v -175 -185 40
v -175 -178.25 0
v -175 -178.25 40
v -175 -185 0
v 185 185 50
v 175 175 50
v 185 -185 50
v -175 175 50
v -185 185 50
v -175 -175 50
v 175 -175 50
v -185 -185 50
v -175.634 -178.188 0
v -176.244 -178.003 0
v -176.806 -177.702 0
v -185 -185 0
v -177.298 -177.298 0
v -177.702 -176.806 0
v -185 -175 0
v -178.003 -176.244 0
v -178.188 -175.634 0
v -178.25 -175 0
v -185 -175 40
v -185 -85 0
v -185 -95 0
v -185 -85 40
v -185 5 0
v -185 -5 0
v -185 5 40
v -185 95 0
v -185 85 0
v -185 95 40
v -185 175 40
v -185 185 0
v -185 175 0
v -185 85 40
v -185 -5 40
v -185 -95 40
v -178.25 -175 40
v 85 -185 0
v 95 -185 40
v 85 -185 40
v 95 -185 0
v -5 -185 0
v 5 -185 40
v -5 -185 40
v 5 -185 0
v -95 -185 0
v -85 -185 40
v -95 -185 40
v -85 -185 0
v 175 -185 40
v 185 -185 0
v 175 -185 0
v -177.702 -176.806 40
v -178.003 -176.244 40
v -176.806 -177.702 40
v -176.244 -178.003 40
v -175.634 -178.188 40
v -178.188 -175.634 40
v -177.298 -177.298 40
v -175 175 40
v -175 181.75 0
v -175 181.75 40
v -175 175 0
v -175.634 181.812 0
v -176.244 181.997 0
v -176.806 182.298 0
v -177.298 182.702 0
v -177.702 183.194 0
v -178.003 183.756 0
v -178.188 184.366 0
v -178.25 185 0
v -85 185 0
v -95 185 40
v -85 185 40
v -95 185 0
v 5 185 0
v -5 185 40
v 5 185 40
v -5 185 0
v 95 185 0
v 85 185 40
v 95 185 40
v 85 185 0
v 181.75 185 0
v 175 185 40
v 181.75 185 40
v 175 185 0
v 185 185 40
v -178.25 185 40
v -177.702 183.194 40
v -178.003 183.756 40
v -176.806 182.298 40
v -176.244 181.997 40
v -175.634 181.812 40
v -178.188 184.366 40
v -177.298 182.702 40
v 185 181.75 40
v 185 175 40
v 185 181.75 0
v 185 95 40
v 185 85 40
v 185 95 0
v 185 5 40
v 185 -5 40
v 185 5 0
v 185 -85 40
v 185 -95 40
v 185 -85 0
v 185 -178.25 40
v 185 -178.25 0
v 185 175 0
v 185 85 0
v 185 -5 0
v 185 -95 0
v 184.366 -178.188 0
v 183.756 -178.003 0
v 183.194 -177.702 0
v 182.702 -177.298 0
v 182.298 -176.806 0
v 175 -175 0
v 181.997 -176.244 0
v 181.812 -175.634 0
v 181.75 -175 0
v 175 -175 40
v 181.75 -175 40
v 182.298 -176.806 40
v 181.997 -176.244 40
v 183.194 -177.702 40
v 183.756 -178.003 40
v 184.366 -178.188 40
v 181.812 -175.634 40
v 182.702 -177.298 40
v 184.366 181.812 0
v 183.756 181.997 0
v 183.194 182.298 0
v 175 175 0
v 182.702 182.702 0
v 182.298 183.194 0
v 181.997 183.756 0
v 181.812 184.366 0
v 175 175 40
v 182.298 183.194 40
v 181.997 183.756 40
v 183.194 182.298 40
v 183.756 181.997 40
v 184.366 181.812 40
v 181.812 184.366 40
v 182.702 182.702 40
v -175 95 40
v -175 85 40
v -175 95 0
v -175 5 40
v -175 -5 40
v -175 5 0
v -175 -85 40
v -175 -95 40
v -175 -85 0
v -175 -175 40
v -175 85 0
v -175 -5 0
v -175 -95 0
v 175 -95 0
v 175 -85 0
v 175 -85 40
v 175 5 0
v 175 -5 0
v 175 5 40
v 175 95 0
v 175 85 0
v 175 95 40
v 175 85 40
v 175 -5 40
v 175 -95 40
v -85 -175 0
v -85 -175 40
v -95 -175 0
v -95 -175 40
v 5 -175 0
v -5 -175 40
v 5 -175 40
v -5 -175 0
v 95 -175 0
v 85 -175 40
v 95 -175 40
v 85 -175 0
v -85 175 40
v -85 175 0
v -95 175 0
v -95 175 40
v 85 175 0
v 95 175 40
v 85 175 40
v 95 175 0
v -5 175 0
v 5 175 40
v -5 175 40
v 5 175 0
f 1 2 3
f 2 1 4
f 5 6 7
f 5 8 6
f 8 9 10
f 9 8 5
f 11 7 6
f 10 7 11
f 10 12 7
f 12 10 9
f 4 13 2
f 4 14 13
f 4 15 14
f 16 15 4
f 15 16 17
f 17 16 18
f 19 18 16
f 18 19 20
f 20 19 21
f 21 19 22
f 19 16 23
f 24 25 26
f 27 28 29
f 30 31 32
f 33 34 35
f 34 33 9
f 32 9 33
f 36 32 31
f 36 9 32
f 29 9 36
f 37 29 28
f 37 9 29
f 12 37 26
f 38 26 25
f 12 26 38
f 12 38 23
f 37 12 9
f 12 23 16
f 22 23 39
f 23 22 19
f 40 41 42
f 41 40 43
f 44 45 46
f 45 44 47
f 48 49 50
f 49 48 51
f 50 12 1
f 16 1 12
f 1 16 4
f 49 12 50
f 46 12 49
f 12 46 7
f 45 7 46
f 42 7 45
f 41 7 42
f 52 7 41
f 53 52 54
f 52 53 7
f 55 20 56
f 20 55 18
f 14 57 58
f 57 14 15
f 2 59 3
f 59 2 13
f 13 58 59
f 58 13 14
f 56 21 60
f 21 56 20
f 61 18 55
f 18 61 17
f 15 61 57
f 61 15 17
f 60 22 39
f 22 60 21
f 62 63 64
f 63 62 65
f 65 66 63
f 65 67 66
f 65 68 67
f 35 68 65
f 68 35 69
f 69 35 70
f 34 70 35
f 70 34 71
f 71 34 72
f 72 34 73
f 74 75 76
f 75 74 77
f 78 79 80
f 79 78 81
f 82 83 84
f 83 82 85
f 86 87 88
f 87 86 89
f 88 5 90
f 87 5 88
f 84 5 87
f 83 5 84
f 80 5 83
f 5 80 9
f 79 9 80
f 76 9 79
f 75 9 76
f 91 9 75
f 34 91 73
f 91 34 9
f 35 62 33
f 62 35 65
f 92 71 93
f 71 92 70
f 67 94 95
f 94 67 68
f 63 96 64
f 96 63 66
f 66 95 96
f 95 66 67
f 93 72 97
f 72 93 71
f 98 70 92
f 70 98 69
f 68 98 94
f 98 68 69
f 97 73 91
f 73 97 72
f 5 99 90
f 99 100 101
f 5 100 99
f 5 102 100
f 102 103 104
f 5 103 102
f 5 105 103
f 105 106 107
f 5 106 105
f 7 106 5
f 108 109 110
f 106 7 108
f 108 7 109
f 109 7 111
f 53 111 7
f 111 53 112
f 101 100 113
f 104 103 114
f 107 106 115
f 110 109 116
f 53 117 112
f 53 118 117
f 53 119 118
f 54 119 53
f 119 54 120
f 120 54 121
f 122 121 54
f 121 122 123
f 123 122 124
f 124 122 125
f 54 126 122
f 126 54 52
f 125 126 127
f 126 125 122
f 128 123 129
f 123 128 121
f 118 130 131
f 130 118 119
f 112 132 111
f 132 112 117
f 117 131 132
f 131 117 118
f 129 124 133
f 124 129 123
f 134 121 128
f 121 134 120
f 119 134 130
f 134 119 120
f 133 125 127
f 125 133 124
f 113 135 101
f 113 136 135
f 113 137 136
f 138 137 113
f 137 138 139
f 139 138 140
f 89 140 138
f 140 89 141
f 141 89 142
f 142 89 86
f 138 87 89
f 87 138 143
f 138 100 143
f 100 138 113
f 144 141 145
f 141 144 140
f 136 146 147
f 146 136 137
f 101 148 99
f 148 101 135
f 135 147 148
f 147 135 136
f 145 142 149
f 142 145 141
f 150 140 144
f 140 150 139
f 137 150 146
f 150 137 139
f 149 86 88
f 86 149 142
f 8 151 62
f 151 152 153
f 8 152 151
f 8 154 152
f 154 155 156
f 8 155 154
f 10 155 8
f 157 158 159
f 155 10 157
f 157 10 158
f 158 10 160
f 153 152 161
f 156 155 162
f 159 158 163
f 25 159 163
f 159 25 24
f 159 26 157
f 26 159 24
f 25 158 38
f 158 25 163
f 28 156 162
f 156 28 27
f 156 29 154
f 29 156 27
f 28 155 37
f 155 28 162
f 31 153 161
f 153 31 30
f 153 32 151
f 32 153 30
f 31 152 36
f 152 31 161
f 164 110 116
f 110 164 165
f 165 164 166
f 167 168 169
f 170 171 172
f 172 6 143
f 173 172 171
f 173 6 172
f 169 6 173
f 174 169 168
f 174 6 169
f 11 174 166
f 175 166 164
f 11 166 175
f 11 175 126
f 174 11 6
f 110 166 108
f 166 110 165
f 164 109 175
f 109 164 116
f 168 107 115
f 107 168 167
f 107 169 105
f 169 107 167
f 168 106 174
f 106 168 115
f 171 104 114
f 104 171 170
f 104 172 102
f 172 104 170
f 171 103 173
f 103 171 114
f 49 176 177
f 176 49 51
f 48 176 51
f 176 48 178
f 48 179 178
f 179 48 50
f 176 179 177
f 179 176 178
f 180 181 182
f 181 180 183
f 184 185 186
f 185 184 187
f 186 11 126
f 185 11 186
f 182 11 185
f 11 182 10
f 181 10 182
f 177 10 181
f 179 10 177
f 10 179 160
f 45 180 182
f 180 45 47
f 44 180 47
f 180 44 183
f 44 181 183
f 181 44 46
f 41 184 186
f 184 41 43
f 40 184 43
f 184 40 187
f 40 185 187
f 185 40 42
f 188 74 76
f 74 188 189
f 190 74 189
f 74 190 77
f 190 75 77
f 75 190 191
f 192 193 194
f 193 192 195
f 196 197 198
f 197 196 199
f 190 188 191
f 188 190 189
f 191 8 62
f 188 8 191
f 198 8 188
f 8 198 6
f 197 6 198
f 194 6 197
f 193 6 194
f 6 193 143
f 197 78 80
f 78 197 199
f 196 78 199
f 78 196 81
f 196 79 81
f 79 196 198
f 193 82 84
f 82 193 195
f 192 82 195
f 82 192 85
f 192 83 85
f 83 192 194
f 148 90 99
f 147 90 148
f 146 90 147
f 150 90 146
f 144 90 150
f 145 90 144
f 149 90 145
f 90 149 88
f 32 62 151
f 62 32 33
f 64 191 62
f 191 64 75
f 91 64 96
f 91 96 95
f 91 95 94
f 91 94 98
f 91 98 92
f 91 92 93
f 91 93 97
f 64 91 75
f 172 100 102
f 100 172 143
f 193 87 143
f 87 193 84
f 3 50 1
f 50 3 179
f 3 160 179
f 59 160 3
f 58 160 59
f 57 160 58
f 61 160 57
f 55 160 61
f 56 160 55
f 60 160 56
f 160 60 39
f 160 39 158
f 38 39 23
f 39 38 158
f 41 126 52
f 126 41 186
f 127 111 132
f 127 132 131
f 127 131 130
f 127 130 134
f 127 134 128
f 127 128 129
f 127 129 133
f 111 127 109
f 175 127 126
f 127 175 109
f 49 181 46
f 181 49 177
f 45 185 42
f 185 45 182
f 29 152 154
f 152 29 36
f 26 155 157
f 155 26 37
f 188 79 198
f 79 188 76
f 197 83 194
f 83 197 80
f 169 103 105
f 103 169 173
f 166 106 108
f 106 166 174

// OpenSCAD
positions = [[-180,-180],[-180,-90],[-180,0],[-180,90],[-180,180],[180,-180],[180,-90],[180,0],[180,90],[180,180],[-90,-180],[0,-180],[90,-180],[-90,180],[0,180],[90,180]];
module vert(px,py){
translate([px,py,25])
difference(){
cube([10,10,50],center=true);
if (abs(px)==180 && abs(py)==180){
translate([5,5,0]) cylinder(r=3.25,h=55,$fn=32,center=true);
}
}
}
module hleft(zh){translate([-180,0,zh]) cube([10,370,10],center=true);}
module hright(zh){translate([180,0,zh]) cube([10,370,10],center=true);}
module hfront(zh){translate([0,-180,zh]) cube([370,10,10],center=true);}
module hback(zh){translate([0,180,zh]) cube([370,10,10],center=true);}
for(p=positions){
vert(p[0],p[1]);
}
hleft(45);
hright(45);
hfront(45);
hback(45);
